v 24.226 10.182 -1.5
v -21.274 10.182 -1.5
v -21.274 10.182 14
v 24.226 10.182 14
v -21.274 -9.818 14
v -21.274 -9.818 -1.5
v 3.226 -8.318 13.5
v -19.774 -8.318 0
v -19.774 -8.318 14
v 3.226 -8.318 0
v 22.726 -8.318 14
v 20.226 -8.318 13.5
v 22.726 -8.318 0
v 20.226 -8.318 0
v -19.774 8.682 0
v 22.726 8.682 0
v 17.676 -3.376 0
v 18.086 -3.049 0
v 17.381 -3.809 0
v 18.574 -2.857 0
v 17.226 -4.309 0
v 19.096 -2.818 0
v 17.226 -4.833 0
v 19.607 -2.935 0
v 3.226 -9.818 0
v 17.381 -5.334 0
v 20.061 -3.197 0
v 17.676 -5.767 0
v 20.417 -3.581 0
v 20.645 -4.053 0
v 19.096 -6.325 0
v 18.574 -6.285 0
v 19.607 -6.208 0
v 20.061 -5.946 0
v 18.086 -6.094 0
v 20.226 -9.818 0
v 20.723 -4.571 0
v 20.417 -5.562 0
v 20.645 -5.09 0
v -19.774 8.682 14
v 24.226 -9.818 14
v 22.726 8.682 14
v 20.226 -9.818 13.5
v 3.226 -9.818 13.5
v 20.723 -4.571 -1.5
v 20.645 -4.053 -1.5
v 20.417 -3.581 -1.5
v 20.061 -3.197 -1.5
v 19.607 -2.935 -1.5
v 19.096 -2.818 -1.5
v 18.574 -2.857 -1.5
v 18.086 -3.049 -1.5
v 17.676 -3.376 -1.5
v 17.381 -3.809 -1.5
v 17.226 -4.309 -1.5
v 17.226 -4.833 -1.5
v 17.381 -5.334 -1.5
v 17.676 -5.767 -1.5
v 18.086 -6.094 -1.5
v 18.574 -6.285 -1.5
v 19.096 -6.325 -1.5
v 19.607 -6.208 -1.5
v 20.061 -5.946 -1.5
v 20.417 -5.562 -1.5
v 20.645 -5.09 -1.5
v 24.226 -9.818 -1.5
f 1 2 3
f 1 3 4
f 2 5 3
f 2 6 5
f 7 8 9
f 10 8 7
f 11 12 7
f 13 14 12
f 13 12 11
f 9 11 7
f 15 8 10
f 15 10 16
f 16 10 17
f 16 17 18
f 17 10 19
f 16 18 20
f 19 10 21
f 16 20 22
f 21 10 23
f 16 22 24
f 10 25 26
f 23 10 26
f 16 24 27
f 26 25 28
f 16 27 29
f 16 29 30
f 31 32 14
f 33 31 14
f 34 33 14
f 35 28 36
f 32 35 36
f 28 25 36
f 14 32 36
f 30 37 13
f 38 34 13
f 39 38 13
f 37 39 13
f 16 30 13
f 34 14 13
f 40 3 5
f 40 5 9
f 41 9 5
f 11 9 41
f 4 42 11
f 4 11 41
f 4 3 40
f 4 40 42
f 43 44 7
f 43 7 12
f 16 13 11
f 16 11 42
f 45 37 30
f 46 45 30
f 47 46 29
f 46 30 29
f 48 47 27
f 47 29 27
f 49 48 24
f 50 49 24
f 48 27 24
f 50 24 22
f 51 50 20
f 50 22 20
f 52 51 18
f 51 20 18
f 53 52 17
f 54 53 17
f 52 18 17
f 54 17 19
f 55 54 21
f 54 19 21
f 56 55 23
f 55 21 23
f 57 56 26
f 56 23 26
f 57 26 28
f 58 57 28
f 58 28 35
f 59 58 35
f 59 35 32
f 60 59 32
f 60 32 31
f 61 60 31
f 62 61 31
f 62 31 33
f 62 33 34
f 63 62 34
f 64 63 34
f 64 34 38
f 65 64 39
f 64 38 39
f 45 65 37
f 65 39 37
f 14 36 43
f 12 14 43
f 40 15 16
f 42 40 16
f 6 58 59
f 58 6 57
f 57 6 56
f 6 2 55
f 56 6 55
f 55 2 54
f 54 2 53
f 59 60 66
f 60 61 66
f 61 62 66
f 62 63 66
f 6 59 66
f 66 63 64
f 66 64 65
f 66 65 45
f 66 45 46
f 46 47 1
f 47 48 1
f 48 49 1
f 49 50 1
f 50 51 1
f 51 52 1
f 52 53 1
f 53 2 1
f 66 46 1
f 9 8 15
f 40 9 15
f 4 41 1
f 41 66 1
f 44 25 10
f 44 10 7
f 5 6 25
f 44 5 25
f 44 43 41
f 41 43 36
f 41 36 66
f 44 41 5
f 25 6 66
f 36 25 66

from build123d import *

# Parameters (mm, degrees)
F0_W     = 45.5000007218
F0_H     = 20.0000007218
F0_W_2   = 42.5
F0_H_2   = 17
F0_R     = 1.7580829865
F1_DEPTH = 1.5
F2_DEPTH = 14
F3_W     = 17
F3_H     = 13.5
F4_DEPTH = 2


with BuildPart() as f1:
    # F0 (on Top) → F1 (new body)
    with BuildSketch(Plane.XY):
        with Locations((1.4756151661, 0.1818094146)):
            Rectangle(F0_W, F0_H)
        with Locations((1.4756151661, 0.1818094146)):
            Rectangle(F0_W_2, F0_H_2, mode=Mode.SUBTRACT)
        with Locations((1.4756151661, 0.1818094146)):
            Rectangle(F0_W_2, F0_H_2)
        with Locations((18.9648512751, -4.5714476146)):
            Circle(F0_R, mode=Mode.SUBTRACT)
    extrude(amount=-F1_DEPTH)

    # F0 (on Top) → F2 (join)
    with BuildSketch(Plane.XY):
        with Locations((1.4756151661, 0.1818094146)):
            Rectangle(F0_W, F0_H)
        with Locations((1.4756151661, 0.1818094146)):
            Rectangle(F0_W_2, F0_H_2, mode=Mode.SUBTRACT)
    extrude(amount=F2_DEPTH)

    # F3 (on face) → F4 (cut)
    with BuildSketch(Plane.XZ.offset(9.8181909463)):
        with Locations((11.725615527, 6.75)):
            Rectangle(F3_W, F3_H)
    extrude(amount=-F4_DEPTH, mode=Mode.SUBTRACT)


solid = f1.part
